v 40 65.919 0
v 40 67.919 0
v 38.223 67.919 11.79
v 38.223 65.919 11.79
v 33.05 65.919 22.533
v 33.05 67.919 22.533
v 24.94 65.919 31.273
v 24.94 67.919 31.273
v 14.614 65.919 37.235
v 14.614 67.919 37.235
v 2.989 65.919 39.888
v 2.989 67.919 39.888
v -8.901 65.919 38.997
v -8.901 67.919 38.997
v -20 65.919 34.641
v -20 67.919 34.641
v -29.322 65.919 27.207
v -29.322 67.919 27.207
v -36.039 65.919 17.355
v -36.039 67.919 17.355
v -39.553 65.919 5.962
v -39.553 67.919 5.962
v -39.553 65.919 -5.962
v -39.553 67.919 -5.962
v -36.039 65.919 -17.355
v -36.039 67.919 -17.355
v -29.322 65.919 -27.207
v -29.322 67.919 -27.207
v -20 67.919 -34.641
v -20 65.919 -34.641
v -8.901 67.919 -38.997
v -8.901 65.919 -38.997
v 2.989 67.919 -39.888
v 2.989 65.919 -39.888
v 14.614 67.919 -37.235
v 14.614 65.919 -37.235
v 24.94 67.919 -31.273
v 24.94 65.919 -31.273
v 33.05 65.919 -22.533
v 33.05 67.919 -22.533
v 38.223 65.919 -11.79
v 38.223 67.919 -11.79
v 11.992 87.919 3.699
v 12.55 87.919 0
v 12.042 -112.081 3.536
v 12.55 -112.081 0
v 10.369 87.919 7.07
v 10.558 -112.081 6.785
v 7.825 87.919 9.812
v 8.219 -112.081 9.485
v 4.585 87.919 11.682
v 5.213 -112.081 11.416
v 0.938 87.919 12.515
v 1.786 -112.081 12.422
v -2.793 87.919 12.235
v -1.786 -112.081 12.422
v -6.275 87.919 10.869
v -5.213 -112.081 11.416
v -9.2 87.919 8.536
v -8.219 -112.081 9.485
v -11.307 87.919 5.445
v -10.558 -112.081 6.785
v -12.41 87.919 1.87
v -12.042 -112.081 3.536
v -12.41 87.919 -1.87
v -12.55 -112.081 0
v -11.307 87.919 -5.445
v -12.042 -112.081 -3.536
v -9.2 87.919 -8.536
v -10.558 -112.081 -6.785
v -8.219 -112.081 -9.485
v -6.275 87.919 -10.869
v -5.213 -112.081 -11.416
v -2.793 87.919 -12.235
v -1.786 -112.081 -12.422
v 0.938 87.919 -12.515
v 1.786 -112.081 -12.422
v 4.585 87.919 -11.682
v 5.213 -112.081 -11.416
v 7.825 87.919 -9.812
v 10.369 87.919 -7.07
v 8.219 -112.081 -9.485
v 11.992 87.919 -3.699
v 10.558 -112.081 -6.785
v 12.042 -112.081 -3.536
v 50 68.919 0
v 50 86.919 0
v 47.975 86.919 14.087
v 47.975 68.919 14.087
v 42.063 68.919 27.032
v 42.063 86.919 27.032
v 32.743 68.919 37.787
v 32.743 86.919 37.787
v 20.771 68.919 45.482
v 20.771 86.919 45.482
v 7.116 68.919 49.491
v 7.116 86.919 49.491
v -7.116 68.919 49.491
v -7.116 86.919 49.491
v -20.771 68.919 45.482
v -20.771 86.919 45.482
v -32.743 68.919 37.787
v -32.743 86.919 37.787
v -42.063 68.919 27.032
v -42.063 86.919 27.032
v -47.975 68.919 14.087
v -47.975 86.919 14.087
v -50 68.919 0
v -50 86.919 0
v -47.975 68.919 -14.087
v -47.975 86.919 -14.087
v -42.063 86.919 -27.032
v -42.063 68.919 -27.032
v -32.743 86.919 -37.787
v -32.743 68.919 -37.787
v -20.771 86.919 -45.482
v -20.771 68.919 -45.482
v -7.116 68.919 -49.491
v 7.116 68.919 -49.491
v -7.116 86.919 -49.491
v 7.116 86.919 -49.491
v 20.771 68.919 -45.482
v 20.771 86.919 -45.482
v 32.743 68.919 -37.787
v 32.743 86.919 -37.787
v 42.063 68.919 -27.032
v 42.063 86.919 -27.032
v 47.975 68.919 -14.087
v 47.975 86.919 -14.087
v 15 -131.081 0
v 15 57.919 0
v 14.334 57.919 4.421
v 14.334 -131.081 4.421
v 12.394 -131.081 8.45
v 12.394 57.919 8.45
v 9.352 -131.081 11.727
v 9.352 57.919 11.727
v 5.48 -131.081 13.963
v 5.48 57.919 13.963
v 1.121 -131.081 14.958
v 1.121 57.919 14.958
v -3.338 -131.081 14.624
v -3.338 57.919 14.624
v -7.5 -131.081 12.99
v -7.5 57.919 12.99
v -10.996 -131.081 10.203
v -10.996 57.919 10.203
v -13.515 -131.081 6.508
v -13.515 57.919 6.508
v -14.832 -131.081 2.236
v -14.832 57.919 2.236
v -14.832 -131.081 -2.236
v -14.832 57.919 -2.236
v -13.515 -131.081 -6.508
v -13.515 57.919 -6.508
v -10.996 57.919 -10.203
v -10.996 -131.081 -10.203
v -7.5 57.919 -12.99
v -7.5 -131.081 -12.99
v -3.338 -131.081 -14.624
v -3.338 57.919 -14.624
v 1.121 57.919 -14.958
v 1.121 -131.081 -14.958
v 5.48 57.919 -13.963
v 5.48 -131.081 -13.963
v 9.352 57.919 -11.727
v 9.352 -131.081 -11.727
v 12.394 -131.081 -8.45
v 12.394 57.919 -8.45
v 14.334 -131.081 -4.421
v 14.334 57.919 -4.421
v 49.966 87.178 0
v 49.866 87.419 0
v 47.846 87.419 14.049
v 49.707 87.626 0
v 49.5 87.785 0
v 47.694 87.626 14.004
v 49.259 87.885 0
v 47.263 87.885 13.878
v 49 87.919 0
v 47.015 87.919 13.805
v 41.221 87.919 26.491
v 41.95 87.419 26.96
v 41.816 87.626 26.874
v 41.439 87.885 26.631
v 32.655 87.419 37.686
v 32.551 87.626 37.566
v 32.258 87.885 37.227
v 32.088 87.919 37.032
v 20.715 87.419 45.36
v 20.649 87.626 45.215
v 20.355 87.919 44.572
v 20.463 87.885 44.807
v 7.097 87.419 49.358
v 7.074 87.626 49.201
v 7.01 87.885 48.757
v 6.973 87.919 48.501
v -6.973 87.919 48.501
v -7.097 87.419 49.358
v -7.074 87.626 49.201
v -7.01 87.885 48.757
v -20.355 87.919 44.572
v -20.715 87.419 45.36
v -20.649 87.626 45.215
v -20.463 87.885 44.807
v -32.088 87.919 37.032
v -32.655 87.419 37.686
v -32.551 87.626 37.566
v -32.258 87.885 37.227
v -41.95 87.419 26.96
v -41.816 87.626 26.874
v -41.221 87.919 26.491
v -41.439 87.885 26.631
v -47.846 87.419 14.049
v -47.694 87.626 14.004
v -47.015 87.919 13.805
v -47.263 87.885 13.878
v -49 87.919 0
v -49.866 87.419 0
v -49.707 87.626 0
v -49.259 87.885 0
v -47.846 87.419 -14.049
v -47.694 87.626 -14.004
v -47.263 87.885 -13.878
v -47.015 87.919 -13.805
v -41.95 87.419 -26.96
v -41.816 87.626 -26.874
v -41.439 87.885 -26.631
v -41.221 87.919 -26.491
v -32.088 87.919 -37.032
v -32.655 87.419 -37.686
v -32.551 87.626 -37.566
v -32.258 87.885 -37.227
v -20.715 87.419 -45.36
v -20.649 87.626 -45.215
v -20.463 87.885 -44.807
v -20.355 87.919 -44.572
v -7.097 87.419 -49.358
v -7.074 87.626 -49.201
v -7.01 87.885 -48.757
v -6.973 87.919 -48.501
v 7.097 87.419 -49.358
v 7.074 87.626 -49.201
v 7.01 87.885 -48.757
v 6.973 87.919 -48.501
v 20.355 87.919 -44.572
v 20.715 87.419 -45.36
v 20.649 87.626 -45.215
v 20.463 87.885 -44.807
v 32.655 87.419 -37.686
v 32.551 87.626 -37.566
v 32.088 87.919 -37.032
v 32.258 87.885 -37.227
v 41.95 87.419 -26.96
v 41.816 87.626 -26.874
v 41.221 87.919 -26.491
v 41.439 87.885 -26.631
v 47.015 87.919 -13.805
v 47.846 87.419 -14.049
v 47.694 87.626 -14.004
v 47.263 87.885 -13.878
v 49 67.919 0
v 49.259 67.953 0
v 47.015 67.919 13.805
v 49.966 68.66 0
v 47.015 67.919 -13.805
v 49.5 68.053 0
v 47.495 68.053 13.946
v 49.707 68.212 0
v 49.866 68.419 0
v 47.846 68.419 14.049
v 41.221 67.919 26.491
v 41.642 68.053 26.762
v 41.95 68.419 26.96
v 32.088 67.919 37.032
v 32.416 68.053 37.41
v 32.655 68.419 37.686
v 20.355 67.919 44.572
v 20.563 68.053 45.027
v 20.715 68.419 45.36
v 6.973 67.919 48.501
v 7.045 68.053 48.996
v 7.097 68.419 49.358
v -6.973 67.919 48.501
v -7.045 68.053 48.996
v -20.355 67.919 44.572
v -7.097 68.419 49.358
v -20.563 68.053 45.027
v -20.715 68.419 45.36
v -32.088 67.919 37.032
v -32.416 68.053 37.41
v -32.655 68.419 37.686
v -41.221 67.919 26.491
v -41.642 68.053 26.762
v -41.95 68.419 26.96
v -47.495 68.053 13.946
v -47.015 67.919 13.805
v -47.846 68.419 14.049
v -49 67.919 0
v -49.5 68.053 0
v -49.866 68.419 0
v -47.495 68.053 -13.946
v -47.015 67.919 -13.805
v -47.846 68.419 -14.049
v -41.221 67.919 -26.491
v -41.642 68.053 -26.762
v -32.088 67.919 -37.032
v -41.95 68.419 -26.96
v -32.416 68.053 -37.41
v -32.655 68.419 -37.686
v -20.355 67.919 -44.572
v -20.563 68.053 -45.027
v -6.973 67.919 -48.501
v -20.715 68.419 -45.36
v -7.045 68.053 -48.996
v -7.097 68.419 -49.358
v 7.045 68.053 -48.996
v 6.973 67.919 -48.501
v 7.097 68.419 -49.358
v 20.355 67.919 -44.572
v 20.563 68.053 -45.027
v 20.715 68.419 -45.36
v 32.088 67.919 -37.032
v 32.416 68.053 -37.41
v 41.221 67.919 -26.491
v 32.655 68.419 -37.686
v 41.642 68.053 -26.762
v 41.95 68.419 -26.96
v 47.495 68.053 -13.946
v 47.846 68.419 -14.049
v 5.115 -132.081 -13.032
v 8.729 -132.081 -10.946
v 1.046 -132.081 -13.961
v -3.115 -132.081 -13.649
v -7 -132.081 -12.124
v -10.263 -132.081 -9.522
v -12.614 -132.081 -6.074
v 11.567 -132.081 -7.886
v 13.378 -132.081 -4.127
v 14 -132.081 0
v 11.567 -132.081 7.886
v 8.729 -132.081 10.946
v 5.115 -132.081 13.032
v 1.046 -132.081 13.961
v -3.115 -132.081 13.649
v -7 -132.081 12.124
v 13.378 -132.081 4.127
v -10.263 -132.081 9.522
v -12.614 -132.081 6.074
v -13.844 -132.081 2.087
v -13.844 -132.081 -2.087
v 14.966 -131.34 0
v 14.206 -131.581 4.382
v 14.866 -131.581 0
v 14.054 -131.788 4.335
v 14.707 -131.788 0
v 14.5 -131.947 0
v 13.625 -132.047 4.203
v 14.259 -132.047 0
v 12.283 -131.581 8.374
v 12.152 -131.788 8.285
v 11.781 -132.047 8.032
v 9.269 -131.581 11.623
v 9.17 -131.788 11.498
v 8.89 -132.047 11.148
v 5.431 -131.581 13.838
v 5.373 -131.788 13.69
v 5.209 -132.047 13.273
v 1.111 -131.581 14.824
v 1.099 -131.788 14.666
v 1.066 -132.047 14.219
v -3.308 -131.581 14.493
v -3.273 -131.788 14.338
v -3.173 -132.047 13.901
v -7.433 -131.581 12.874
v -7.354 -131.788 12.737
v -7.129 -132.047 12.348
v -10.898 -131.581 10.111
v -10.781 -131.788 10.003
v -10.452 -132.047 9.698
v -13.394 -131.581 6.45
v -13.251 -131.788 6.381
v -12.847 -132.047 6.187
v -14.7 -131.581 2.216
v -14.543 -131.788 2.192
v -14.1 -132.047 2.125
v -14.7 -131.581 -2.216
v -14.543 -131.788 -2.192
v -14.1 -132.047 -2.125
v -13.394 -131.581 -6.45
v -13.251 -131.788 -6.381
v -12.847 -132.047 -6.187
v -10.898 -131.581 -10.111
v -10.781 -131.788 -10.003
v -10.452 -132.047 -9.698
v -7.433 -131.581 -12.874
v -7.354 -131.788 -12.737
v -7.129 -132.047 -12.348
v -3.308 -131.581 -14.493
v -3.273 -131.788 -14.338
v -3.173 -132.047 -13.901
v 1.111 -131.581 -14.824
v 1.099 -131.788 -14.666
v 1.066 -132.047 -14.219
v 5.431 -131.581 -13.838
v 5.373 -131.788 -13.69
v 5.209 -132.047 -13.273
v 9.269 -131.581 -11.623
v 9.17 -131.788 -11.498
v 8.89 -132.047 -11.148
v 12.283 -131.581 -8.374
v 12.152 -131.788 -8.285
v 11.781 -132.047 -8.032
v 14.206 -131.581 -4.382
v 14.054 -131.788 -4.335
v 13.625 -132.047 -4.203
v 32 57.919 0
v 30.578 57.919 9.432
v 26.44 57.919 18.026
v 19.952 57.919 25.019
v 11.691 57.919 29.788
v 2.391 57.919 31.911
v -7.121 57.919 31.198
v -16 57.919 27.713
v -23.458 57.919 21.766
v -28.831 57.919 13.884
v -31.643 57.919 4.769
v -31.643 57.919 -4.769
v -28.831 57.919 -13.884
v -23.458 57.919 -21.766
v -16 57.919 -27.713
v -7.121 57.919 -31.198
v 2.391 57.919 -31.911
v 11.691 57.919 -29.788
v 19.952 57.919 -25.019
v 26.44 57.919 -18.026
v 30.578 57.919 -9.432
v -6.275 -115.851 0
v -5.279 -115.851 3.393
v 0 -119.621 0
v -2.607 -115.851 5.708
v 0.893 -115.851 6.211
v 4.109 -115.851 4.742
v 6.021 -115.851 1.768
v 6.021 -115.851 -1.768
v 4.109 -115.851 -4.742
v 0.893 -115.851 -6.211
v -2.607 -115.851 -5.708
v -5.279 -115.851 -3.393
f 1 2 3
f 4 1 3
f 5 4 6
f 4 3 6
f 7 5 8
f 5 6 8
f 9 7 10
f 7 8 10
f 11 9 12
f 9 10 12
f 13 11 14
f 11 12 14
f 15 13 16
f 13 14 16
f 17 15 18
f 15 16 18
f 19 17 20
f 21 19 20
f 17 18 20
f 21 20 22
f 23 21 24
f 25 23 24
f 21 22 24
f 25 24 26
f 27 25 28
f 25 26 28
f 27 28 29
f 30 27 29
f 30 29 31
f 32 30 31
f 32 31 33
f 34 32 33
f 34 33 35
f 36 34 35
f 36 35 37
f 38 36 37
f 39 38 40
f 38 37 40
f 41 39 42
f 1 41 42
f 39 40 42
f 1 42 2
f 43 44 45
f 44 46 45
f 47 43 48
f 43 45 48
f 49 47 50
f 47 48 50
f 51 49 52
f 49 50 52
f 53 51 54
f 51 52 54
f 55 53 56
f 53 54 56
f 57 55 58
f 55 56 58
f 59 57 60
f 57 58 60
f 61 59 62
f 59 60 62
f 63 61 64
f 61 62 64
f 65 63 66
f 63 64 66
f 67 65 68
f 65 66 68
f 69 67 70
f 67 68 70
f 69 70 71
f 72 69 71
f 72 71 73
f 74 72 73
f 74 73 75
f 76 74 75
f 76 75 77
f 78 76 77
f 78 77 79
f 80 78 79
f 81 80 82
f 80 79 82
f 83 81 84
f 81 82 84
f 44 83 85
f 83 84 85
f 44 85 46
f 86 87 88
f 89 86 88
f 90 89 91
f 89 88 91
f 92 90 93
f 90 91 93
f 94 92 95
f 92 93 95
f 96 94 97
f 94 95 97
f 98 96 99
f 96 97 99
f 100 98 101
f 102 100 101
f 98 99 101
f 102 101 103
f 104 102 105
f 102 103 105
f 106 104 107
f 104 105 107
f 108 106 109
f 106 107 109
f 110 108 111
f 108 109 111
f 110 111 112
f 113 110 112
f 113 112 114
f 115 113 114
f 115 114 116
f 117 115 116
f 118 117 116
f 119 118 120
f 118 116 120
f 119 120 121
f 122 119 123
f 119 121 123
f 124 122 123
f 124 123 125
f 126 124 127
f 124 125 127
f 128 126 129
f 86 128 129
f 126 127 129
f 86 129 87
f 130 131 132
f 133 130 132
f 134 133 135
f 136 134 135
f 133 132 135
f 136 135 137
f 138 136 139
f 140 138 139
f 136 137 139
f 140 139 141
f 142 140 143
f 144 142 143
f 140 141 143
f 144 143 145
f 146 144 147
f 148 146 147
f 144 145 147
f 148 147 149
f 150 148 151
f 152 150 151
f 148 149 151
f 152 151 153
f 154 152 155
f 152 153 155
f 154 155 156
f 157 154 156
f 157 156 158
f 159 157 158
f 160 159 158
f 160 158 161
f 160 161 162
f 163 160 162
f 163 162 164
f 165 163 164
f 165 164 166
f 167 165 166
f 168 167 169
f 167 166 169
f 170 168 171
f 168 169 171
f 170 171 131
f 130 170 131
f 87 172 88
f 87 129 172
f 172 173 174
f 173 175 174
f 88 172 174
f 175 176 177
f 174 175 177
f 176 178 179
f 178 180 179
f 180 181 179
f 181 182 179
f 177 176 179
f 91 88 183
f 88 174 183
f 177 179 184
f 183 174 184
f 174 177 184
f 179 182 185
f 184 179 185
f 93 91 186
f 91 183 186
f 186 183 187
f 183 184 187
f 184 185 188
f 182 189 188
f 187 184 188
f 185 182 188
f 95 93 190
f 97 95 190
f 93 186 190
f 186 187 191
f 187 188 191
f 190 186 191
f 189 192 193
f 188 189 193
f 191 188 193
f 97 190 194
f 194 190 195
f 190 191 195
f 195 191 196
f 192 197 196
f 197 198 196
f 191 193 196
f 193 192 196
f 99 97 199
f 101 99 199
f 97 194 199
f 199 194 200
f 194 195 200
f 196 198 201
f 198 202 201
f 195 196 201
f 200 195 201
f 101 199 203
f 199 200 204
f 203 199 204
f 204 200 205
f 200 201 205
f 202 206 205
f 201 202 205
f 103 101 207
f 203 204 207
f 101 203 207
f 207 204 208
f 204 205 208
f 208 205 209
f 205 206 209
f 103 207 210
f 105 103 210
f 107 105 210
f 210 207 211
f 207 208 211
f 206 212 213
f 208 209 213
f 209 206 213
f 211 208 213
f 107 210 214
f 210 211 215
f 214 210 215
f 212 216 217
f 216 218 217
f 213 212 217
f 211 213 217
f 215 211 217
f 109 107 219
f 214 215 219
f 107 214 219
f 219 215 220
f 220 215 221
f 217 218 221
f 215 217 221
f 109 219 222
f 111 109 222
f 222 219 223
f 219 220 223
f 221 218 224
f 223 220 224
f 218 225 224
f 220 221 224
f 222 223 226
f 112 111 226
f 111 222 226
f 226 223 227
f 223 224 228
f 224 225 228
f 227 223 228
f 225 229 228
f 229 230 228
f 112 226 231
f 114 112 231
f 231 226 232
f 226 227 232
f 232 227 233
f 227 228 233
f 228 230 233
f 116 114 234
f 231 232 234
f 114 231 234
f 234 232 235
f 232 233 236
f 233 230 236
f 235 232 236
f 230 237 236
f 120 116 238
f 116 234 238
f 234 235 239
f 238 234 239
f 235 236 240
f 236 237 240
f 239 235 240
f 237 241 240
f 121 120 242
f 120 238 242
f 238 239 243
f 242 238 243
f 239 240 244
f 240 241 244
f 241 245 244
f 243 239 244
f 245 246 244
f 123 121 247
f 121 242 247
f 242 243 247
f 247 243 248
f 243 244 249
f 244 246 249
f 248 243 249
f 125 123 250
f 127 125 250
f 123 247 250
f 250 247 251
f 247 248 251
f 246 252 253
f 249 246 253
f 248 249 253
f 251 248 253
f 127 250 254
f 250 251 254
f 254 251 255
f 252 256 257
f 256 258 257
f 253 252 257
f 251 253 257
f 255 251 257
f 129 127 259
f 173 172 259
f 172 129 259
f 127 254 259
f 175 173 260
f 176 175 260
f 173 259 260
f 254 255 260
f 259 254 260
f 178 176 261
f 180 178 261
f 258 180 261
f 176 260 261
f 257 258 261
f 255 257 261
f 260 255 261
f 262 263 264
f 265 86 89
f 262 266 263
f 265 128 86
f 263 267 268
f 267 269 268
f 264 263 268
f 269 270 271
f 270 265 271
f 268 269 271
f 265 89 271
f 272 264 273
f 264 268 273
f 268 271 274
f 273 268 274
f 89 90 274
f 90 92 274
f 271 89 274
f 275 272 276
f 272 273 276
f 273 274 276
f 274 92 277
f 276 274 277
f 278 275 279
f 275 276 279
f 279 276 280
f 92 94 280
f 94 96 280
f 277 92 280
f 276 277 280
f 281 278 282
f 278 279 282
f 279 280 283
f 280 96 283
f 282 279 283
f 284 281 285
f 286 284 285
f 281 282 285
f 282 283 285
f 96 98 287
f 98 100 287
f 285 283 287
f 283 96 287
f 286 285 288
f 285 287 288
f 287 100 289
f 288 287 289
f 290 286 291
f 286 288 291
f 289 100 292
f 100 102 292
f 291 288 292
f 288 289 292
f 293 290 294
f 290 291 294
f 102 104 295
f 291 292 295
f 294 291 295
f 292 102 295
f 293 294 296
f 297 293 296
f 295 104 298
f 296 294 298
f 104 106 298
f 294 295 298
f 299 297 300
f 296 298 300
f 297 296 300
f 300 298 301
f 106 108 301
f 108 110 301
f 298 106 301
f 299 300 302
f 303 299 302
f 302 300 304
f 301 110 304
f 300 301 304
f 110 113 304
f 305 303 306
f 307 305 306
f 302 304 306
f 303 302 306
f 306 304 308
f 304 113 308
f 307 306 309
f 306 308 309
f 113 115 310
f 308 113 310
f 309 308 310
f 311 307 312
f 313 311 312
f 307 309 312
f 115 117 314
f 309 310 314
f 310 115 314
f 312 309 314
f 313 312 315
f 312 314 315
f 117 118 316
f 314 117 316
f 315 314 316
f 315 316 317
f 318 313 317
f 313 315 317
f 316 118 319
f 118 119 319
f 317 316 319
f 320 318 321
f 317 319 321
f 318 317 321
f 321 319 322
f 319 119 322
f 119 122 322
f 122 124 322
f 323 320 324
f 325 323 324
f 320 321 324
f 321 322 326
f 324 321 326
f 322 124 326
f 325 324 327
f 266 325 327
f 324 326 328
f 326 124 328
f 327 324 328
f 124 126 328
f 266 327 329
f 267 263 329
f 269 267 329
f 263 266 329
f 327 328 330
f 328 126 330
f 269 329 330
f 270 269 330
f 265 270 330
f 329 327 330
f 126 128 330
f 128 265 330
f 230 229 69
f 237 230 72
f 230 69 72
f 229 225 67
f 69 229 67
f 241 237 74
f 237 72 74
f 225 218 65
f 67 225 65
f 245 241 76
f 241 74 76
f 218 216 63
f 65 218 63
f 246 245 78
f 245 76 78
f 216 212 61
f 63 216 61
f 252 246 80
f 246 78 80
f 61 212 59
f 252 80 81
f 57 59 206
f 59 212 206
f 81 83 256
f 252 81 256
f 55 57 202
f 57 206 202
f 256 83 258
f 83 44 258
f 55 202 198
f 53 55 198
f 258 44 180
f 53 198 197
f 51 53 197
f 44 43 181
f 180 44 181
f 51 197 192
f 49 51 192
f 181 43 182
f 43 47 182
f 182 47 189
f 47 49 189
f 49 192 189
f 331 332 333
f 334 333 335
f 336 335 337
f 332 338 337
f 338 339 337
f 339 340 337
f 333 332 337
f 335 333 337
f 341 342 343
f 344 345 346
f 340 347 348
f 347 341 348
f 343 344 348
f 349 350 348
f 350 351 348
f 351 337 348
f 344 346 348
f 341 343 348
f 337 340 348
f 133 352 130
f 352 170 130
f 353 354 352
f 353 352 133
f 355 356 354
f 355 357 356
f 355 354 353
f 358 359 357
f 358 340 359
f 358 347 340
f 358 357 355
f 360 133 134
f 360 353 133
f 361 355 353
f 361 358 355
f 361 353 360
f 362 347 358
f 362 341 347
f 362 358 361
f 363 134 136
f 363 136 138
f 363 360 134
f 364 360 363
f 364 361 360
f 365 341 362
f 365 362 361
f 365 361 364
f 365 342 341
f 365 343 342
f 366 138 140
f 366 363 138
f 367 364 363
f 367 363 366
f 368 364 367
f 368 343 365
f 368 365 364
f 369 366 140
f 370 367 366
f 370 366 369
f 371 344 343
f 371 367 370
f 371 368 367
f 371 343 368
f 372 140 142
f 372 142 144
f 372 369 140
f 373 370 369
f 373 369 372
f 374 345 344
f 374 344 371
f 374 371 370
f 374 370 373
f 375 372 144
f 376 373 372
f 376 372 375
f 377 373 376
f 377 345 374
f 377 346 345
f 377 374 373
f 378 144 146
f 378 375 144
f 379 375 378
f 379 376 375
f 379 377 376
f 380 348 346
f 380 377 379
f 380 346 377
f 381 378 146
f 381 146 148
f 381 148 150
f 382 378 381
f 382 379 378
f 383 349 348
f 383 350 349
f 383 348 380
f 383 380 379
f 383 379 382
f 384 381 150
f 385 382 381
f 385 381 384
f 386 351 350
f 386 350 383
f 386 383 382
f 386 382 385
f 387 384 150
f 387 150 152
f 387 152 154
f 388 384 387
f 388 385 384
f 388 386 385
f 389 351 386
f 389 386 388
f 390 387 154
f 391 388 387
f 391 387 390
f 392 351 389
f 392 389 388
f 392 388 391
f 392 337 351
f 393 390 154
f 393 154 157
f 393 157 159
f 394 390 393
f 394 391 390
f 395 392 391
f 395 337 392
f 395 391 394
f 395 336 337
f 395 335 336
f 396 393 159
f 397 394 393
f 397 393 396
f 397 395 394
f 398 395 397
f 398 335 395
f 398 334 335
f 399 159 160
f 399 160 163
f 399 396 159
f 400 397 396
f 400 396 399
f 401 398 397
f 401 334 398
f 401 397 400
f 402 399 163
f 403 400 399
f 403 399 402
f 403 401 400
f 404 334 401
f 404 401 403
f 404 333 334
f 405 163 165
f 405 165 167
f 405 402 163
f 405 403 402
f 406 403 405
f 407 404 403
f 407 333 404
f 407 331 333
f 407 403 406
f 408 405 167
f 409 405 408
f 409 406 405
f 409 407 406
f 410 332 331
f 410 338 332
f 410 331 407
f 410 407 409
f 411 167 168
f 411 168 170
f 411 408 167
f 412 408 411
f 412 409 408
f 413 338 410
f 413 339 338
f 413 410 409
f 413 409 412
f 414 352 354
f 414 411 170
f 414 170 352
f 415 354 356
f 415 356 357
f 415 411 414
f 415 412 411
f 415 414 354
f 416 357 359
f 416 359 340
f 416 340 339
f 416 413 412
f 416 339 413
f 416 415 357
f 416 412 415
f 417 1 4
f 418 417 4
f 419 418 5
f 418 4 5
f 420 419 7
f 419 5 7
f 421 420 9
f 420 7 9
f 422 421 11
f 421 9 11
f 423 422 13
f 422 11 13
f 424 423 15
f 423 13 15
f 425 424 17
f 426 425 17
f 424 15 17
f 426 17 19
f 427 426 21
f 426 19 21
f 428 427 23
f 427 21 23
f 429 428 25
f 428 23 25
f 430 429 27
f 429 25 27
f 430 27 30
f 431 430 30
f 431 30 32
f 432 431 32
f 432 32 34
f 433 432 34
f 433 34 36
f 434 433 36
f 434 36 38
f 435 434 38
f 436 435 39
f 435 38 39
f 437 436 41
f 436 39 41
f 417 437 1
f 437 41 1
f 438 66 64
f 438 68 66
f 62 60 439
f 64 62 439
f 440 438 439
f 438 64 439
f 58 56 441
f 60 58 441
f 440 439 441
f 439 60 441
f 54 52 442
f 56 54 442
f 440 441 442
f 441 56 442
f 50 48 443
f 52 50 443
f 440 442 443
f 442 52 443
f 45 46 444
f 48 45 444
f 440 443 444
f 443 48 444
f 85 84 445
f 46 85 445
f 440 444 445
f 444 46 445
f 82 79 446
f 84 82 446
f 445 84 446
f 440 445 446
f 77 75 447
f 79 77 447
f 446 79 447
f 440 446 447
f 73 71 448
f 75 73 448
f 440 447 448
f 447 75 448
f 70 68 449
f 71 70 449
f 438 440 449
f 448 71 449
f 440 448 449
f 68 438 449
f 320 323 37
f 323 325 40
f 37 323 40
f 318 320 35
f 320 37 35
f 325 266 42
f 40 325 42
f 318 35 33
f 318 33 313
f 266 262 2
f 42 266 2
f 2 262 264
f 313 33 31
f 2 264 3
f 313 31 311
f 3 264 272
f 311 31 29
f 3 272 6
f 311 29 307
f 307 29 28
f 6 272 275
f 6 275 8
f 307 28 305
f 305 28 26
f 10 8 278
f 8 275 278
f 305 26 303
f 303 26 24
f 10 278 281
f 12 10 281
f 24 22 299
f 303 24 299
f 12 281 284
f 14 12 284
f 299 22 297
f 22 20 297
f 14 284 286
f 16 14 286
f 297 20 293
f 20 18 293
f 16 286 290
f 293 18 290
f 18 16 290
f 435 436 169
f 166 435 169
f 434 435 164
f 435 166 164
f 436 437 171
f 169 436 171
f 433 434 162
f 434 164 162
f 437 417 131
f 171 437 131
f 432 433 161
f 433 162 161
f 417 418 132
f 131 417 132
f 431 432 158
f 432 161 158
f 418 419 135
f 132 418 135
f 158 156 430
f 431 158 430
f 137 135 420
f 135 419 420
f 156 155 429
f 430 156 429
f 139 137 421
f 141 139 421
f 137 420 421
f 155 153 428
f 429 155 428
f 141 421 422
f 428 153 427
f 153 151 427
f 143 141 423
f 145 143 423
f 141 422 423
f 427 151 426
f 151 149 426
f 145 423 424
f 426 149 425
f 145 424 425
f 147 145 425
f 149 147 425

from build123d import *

# Parameters (mm, degrees)
F0_W     = 25
F0_H     = 10
F3_D     = 25.1
F3_DEPTH = 200
F3_TIP   = 7.5408007688
F4_R     = 1
F5_SIZE  = 8
F6_R     = 1


with BuildPart() as f1:
    # F0 (on Top) → F1 (revolve)
    with BuildSketch(Plane.XY):
        with Locations((27.5, 62.9193106468)):
            Rectangle(F0_W, F0_H)
        Polygon((0, 87.9193106468), (0, -132.0806893532), (15, -132.0806893532), (15, 57.9193106468), (15, 67.9193106468), (40, 67.9193106468), (50, 67.9193106468), (50, 87.9193106468), align=None)
    revolve(axis=Axis((0, -22.0806893532, 0), (0, -1, 0)))

    # F3
    with Locations(Plane(origin=(0, 87.9193106468, 0), x_dir=(-1, 0, 0), z_dir=(0, 1, 0))):
        with Locations((0, 0)):
            Hole(F3_D / 2, depth=F3_DEPTH)
            with Locations((0, 0, -(F3_DEPTH + F3_TIP / 2))):  # 118° drill point
                Cone(0, F3_D / 2, F3_TIP, mode=Mode.SUBTRACT)

    # F4
    f4_edges = [f1.edges().sort_by_distance(p)[0] for p in [
        (-50, 87.919311, 0),
        (-15, -132.080689, 0),
    ]]
    fillet(f4_edges, radius=F4_R)

    # F5
    f5_edges = [f1.edges().sort_by_distance(p)[0] for p in [
        (-40, 57.919311, 0),
    ]]
    chamfer(f5_edges, length=F5_SIZE)

    # F6
    f6_edges = [f1.edges().sort_by_distance(p)[0] for p in [
        (-50, 67.919311, 0),
    ]]
    fillet(f6_edges, radius=F6_R)


solid = f1.part
